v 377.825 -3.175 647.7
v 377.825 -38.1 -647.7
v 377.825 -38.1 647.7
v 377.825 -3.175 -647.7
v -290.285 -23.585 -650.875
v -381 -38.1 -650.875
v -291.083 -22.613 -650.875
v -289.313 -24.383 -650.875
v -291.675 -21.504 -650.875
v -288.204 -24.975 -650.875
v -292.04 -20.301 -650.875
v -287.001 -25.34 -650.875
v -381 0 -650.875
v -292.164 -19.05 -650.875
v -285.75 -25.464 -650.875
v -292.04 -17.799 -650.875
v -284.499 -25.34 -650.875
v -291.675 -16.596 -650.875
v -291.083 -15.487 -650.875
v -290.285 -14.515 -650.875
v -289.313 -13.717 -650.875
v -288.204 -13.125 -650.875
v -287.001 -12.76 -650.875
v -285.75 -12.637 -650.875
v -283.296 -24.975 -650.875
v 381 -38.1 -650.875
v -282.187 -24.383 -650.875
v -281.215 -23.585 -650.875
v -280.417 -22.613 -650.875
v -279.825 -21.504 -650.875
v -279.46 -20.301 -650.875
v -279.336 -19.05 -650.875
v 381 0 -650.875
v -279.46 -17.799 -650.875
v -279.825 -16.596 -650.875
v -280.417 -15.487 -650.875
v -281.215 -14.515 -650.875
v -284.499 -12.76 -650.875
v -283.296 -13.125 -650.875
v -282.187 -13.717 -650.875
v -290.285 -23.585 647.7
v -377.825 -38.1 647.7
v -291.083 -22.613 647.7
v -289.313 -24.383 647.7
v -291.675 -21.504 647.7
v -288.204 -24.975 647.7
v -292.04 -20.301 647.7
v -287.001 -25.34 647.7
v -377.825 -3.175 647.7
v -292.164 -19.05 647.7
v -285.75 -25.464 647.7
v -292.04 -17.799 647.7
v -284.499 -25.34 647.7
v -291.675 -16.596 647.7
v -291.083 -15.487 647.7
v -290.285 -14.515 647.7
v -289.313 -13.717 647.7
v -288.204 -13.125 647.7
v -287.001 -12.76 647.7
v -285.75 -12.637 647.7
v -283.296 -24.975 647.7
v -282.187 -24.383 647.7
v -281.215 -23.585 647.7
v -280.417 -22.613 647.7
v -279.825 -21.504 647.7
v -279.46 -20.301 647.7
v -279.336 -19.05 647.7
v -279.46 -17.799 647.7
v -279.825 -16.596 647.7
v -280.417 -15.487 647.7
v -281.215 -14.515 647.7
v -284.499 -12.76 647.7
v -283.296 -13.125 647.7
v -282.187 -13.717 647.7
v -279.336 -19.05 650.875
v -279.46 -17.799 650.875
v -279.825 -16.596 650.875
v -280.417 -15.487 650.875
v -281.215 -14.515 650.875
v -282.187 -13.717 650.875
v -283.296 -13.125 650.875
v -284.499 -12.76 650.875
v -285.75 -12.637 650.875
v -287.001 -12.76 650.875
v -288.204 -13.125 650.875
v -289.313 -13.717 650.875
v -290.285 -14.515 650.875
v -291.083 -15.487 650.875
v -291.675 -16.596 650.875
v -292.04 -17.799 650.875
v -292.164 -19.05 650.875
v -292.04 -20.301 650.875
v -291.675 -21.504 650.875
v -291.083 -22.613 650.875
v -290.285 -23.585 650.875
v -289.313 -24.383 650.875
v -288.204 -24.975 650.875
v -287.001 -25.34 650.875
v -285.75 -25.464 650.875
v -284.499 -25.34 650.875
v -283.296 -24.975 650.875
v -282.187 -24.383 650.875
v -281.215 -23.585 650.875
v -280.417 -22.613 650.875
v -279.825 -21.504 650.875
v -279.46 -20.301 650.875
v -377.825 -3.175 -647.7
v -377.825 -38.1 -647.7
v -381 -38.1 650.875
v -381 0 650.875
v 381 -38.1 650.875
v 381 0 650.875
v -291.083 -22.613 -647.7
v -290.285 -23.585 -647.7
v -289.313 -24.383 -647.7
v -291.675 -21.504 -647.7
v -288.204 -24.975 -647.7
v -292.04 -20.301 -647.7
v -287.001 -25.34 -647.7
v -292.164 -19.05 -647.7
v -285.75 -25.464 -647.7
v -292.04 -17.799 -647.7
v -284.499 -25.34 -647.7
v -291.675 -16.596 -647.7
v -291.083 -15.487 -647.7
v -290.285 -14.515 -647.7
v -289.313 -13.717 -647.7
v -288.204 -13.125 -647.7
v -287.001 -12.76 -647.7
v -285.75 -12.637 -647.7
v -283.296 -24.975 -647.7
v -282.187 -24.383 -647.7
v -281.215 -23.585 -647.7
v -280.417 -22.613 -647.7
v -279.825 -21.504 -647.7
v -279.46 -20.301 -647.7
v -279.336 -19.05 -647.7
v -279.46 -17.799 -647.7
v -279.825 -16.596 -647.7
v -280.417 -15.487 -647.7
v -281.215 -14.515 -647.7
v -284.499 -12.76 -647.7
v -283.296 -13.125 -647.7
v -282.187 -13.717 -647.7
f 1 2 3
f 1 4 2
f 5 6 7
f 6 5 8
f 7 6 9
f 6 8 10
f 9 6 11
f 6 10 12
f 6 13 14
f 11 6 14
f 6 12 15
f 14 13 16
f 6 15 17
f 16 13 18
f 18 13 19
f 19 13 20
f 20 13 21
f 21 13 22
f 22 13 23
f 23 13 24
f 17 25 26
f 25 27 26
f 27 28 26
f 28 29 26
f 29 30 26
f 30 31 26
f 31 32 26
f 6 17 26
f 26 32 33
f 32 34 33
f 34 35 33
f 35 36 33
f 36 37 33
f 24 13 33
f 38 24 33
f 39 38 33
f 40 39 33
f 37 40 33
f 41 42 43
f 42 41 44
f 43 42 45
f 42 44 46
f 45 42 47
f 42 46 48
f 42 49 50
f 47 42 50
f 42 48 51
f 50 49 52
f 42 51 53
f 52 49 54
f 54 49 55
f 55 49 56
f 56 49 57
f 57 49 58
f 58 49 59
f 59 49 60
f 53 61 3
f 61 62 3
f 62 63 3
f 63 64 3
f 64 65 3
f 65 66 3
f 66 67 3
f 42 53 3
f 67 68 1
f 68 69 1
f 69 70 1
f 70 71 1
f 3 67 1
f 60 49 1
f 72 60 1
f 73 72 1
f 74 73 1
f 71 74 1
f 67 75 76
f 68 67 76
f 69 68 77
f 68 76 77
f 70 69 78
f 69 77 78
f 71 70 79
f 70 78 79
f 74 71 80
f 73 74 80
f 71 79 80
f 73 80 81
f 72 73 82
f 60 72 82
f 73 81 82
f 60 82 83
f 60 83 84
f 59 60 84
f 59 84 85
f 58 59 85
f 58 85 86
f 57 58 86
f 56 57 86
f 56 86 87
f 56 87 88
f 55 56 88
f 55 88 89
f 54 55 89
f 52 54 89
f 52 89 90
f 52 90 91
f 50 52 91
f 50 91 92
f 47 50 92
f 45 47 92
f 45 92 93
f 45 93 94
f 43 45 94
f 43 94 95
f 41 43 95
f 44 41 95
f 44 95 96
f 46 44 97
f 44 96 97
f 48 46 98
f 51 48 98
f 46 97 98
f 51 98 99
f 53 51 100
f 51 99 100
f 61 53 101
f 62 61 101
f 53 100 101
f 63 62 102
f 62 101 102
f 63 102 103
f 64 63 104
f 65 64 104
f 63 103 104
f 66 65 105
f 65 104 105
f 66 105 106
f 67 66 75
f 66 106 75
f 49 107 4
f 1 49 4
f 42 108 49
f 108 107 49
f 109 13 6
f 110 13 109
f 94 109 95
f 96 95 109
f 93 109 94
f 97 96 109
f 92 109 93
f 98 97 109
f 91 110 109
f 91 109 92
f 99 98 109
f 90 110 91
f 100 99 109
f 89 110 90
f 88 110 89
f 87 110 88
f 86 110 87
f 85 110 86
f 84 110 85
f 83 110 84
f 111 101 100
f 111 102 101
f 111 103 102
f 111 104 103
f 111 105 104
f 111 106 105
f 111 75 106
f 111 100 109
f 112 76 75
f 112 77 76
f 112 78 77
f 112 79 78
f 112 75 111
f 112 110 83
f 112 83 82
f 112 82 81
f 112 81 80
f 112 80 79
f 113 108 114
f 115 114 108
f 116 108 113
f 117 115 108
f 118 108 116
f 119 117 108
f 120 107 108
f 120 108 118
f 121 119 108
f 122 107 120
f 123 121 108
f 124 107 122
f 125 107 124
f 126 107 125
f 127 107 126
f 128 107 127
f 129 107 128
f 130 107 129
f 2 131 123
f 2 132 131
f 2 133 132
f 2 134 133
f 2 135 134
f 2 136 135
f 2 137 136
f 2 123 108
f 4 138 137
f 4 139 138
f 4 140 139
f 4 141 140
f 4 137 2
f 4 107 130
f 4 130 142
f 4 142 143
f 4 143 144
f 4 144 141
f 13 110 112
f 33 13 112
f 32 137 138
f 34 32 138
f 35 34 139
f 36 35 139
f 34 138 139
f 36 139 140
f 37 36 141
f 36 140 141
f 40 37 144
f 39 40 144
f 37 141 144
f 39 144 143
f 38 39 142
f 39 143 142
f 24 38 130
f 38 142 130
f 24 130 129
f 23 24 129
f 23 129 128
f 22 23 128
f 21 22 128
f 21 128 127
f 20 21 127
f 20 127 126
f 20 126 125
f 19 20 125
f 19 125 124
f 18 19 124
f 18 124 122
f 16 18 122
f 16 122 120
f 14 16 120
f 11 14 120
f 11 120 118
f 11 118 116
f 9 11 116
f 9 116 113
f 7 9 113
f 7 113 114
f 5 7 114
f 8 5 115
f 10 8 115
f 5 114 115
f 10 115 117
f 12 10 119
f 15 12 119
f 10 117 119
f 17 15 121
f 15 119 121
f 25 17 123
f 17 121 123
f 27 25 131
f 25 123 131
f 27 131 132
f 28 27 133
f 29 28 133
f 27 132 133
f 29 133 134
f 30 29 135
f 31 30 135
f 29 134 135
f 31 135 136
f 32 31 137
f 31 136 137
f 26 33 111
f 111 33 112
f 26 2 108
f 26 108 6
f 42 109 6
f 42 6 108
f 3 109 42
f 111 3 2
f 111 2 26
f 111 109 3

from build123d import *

# Parameters (mm, degrees)
F0_W     = 762
F0_H     = 1301.75
F1_DEPTH = 38.1
F2_T     = -3.175
F3_R     = 6.4135
F4_DEPTH = 1301.751


with BuildPart() as f1:
    # F0 (on Front) → F1 (new body)
    with BuildSketch(Plane.XZ):
        Rectangle(F0_W, F0_H)
    extrude(amount=F1_DEPTH)

    # F2
    f2_openings = [f1.faces().sort_by_distance(p)[0] for p in [
        (0, -38.1, 0),
    ]]
    offset(amount=F2_T, openings=f2_openings)

    # F3 (on face) → F4 (cut, through all)
    with BuildSketch(Plane.XY.offset(650.875)):
        with Locations((-285.75, -19.05)):
            Circle(F3_R)
    extrude(amount=-F4_DEPTH, mode=Mode.SUBTRACT)


solid = f1.part
